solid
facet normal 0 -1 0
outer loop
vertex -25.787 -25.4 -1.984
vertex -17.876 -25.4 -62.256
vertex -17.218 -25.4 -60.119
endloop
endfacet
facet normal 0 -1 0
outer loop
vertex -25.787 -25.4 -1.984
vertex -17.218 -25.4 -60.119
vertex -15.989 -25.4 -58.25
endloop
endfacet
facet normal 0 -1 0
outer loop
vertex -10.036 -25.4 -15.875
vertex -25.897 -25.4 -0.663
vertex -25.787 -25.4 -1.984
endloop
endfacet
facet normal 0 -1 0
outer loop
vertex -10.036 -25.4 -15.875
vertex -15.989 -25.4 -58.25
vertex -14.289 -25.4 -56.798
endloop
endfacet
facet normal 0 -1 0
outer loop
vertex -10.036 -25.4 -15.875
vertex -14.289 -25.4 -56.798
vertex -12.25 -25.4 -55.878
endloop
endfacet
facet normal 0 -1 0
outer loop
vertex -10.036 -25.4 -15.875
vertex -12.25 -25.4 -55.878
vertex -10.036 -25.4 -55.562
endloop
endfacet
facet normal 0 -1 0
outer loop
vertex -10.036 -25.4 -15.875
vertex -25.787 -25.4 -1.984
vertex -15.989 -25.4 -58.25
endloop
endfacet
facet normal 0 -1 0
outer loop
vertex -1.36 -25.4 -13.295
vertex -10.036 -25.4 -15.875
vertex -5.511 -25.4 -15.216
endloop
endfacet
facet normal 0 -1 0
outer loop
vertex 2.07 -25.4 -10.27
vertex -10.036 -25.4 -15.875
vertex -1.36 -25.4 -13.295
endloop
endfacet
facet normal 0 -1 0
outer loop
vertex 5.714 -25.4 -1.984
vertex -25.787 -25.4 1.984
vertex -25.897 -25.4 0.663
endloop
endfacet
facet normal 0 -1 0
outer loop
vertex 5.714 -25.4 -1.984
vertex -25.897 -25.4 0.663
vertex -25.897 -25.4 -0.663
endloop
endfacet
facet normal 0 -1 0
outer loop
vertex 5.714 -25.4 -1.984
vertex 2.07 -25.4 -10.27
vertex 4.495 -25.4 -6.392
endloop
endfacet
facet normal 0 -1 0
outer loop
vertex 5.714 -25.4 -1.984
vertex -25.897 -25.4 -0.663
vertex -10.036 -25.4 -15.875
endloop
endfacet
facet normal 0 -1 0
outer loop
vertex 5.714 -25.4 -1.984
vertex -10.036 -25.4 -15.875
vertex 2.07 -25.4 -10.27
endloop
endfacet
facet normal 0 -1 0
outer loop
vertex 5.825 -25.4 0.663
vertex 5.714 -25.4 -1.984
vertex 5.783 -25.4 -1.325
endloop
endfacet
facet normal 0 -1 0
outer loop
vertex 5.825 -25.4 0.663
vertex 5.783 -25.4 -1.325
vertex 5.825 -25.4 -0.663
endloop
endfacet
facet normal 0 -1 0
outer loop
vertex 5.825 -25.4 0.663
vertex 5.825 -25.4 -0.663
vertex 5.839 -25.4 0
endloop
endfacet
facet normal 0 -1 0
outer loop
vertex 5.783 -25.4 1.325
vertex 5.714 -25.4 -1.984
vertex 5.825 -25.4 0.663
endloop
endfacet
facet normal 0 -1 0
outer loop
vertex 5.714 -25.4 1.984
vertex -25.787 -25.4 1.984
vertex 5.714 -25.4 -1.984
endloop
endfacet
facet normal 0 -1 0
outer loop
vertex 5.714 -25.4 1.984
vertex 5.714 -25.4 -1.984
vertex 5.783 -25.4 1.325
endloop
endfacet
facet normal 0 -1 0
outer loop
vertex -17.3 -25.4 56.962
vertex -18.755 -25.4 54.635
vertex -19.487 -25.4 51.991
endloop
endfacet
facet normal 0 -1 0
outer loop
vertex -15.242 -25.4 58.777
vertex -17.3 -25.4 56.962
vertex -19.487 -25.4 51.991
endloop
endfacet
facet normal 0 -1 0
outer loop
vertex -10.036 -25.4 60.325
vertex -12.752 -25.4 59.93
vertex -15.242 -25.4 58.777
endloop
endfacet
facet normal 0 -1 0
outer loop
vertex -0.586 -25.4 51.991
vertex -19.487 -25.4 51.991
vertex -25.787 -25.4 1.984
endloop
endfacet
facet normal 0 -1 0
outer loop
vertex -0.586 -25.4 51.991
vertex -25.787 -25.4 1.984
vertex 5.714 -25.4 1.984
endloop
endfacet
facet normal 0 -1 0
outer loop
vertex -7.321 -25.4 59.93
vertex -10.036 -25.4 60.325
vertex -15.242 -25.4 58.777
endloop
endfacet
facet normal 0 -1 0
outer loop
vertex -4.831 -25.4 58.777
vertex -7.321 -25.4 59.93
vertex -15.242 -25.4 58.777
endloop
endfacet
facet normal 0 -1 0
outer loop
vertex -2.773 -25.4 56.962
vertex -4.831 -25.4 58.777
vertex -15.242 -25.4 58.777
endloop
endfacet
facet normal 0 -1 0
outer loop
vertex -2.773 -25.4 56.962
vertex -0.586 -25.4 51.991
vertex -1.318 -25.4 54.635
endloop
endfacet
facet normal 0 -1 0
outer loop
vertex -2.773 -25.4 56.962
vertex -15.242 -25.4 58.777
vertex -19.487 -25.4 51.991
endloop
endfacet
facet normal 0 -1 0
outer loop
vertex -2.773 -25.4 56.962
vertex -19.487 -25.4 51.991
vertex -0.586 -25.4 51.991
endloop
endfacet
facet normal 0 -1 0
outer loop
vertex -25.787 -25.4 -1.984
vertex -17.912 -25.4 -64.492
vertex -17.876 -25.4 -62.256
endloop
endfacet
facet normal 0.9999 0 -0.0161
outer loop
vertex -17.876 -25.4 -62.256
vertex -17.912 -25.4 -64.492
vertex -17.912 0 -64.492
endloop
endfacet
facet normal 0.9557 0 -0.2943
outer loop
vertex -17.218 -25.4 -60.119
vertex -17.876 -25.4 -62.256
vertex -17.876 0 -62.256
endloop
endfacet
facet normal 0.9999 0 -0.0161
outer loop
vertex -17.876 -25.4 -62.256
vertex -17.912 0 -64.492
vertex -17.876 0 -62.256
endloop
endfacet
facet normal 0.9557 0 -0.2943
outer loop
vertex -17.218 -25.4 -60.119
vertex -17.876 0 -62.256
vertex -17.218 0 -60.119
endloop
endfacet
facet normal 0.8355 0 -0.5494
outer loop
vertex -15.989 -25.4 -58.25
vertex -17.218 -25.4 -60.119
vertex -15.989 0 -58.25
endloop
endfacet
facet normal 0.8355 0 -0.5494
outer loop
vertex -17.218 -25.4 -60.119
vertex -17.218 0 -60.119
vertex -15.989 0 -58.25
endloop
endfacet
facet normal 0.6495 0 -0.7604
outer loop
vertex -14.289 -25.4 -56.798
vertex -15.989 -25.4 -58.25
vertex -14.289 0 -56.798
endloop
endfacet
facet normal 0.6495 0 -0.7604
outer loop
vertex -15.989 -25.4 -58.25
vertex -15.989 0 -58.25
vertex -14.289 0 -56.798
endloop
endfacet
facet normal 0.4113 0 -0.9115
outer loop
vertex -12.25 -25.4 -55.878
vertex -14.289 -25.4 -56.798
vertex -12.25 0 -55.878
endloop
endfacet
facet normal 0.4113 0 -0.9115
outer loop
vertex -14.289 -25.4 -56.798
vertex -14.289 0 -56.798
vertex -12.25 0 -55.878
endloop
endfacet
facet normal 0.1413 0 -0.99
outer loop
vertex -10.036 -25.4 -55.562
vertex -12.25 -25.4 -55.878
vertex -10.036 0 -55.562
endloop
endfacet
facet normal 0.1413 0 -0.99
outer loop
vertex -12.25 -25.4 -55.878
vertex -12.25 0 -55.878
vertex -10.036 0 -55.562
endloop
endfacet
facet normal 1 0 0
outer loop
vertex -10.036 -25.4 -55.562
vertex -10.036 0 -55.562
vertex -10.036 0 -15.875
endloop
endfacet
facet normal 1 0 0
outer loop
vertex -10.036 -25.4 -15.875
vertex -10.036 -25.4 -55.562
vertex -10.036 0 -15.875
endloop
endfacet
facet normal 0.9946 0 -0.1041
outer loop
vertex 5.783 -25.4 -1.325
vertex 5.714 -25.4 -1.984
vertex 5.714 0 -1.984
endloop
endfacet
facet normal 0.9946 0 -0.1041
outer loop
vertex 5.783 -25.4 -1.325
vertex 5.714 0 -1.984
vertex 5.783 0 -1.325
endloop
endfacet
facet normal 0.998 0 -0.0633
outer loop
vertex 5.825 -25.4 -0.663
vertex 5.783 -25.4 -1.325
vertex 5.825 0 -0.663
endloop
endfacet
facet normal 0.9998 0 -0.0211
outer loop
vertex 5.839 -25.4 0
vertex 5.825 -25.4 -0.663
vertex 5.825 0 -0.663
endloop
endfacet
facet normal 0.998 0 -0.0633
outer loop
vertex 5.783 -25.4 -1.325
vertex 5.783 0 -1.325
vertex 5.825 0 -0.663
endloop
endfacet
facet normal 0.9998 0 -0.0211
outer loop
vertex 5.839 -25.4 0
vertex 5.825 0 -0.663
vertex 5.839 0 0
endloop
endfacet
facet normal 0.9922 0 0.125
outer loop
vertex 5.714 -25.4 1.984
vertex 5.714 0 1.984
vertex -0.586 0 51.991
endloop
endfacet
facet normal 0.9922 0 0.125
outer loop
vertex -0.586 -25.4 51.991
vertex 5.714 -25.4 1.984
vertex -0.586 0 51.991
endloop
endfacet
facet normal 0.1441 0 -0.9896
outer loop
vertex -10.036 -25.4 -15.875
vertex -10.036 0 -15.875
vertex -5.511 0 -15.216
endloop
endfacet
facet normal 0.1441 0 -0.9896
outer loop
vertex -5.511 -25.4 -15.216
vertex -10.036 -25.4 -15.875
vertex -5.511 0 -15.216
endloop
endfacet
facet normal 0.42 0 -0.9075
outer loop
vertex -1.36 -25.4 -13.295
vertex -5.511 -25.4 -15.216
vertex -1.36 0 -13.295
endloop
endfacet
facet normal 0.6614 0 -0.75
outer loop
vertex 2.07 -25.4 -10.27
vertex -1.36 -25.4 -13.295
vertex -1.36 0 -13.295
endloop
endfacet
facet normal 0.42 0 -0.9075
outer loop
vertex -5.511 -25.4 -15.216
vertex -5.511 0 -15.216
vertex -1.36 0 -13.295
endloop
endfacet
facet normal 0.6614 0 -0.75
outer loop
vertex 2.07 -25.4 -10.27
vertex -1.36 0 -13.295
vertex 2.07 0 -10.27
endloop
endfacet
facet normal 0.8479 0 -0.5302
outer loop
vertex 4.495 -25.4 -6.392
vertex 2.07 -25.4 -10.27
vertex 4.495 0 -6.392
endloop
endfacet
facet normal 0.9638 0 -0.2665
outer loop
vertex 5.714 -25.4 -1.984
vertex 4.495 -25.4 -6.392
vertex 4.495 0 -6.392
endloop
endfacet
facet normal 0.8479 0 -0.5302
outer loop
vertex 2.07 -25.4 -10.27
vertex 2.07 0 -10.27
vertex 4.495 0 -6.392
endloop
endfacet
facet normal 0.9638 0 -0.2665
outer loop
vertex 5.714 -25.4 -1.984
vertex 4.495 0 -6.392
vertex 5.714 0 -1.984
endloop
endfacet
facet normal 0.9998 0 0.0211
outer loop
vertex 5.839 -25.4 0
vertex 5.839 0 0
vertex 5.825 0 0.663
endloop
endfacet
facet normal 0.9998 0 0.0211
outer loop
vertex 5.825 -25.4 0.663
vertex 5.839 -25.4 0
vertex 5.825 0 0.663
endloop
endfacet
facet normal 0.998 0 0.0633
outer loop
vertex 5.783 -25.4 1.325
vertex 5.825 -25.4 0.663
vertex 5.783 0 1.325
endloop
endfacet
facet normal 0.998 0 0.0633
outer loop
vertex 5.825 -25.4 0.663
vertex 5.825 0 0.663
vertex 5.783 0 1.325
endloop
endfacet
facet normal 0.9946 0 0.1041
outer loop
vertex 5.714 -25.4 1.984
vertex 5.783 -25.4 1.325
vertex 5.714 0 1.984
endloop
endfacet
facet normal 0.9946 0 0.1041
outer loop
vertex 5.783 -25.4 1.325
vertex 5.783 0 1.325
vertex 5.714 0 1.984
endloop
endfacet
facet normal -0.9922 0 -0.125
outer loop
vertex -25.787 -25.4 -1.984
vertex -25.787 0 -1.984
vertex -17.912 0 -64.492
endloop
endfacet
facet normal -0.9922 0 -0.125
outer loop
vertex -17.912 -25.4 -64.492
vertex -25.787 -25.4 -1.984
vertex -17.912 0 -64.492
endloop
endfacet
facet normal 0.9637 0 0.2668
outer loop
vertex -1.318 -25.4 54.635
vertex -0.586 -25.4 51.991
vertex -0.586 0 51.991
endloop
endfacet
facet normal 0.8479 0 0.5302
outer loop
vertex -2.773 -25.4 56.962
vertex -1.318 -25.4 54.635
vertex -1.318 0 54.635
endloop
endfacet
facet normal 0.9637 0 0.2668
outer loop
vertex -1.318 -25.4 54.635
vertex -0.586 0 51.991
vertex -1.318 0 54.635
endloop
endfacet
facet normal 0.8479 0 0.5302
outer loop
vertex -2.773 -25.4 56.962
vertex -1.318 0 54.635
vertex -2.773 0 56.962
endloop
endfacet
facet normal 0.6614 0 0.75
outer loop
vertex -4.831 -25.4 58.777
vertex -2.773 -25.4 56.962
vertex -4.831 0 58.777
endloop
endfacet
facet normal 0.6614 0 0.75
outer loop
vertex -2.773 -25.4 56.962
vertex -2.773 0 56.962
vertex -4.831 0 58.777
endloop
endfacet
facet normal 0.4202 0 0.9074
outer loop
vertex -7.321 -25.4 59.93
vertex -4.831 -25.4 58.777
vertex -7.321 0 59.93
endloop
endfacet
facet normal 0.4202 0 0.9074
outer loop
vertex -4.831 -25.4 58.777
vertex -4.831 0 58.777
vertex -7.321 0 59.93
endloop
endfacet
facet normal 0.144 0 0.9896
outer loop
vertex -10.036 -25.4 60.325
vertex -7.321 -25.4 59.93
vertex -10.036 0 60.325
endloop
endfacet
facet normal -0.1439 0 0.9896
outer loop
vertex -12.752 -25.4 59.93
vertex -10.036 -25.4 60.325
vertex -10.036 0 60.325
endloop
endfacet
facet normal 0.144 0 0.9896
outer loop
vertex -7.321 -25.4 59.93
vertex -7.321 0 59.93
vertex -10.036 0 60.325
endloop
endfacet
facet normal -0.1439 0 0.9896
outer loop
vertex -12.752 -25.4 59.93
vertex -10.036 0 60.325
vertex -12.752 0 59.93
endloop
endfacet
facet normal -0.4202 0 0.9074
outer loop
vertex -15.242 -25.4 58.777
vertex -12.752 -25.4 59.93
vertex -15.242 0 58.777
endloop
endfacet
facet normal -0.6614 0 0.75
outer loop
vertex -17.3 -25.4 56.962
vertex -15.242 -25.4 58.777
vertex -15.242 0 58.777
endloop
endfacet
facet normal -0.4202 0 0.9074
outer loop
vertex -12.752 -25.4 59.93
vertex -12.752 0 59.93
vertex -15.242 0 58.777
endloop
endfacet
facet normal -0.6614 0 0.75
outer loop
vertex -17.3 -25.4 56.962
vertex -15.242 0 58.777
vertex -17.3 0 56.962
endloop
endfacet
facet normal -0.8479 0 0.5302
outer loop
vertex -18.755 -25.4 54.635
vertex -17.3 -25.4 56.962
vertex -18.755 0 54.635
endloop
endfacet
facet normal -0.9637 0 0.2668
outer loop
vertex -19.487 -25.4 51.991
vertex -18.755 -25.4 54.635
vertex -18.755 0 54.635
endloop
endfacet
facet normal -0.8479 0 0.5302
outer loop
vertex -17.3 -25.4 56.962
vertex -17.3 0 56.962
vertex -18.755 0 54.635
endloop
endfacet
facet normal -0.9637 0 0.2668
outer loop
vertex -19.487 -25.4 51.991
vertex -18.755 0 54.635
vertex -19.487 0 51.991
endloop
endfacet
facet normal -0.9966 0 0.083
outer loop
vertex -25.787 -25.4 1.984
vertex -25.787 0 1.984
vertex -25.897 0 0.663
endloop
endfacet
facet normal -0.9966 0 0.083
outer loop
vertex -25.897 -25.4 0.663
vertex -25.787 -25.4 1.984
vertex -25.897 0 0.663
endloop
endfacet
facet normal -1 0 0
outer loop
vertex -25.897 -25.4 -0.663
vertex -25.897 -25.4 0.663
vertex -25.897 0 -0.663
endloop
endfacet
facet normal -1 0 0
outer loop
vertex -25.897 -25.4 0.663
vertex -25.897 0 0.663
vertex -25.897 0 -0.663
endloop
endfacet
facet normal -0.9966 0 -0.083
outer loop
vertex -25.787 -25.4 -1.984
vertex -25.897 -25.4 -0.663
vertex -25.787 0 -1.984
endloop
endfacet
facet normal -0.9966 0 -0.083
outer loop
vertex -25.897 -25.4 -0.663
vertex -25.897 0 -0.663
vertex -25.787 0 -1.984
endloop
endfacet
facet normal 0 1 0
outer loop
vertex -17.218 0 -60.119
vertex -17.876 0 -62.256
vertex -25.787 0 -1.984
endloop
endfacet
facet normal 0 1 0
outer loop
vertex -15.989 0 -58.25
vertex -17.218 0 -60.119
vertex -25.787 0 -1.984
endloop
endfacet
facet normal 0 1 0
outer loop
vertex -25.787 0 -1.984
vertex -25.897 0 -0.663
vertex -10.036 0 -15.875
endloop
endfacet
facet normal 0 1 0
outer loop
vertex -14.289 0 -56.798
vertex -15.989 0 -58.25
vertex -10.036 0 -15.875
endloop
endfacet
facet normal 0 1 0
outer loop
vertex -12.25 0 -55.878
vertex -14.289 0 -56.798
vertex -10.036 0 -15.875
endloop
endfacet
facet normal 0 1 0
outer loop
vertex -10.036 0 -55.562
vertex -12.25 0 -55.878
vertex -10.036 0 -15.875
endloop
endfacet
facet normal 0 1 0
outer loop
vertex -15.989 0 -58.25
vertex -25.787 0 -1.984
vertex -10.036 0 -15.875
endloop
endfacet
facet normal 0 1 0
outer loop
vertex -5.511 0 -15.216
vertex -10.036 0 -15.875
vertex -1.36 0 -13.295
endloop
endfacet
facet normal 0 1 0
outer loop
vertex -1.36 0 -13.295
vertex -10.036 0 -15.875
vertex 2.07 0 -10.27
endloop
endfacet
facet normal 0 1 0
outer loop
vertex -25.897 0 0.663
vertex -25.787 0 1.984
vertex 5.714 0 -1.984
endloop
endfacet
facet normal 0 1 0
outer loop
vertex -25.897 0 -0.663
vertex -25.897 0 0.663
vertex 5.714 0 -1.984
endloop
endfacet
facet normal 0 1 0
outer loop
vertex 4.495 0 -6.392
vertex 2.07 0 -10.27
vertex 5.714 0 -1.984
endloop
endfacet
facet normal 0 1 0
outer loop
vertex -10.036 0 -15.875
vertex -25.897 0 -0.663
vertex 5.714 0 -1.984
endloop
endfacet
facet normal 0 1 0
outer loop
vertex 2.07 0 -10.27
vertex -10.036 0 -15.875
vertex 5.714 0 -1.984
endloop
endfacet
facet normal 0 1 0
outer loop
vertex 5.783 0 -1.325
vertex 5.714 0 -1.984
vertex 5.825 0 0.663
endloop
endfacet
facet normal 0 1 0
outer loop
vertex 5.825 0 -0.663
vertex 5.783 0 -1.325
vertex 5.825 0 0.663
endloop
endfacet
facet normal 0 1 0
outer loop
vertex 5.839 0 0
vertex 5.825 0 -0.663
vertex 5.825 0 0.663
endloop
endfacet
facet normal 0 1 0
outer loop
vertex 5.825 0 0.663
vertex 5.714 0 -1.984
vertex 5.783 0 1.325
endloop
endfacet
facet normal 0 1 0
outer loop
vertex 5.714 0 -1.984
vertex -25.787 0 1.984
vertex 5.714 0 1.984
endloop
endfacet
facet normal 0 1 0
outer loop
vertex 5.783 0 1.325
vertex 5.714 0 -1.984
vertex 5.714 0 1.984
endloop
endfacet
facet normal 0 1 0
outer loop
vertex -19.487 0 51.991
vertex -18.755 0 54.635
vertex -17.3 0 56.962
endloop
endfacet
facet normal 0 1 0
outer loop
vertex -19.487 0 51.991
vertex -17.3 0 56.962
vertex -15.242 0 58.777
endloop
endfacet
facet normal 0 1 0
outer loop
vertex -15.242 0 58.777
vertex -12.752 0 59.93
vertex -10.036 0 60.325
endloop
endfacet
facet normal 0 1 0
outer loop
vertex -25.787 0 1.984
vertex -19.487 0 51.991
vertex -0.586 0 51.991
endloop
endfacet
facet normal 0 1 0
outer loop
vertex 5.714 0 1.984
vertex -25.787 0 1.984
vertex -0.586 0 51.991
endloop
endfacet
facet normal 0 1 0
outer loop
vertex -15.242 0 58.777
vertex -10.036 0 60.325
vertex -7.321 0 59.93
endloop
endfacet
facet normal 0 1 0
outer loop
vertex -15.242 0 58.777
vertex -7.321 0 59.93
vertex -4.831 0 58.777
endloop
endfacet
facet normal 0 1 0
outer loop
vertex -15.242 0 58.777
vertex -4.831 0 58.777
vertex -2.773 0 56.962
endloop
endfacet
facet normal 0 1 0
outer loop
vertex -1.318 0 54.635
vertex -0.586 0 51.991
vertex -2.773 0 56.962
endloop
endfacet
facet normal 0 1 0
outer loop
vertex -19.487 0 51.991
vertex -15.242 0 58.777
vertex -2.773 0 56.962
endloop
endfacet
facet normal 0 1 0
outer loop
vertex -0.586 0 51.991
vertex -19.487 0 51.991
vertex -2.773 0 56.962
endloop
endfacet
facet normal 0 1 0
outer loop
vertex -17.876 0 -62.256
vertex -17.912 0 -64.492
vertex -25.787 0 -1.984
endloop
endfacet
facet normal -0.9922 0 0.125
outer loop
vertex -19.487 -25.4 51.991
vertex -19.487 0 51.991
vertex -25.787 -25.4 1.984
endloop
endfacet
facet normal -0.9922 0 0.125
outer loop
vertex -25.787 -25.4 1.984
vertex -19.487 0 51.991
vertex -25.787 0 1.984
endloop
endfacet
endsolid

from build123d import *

# Parameters (mm, degrees)
F1_DEPTH = 25.4


with BuildPart() as f1:
    # F0 (on Front) → F1 (new body)
    with BuildSketch(Plane.XZ):
        with BuildLine():
            Line((-10.0362645829, 15.875), (-10.0362645829, 41.275))
            ThreePointArc((-10.0362645829, 41.275), (-17.1800145829, 44.4998046905), (-19.4865575472, 51.990625))
            Line((-19.4865575472, 51.990625), (-25.7867528388, 1.9843751413))
            ThreePointArc((-25.7867528388, 1.9843751413), (-20.5365900453, 11.9062500471), (-10.0362645829, 15.875))
        make_face()
        with BuildLine():
            ThreePointArc((-0.5112645829, 50.8), (-3.3010724921, 44.0648079092), (-10.0362645829, 41.275))
            Line((-10.0362645829, 41.275), (-10.0362645829, 15.875))
            ThreePointArc((-10.0362645829, 15.875), (0.4640609188, 11.9062500123), (5.7142236861, 1.984375037))
            Line((5.7142236861, 1.984375037), (-0.5859716187, 51.990625))
            ThreePointArc((-0.5859716187, 51.990625), (-0.5299596887, 51.396483242), (-0.5112645829, 50.8))
        make_face()
        with BuildLine():
            Line((-10.0362645829, -15.875), (-10.0362645829, 15.875))
            ThreePointArc((-10.0362645829, 15.875), (-20.5365900453, 11.9062500471), (-25.7867528388, 1.9843751413))
            ThreePointArc((-25.7867528388, 1.9843751413), (-25.9112645829, 5.44e-08), (-25.7867528524, -1.9843750333))
            ThreePointArc((-25.7867528524, -1.9843750333), (-20.5365900862, -11.9062500111), (-10.0362645829, -15.875))
        make_face()
        with BuildLine():
            ThreePointArc((5.7142236861, 1.984375037), (0.4640609188, 11.9062500123), (-10.0362645829, 15.875))
            Line((-10.0362645829, 15.875), (-10.0362645829, -15.875))
            ThreePointArc((-10.0362645829, -15.875), (0.4640609203, -11.9062500111), (5.7142236865, -1.9843750333))
            ThreePointArc((5.7142236865, -1.9843750333), (5.8075769064, -0.9941387534), (5.8387354171, 0))
            ThreePointArc((5.8387354171, 0), (5.8075769063, 0.9941387552), (5.7142236861, 1.984375037))
        make_face()
        with BuildLine():
            Line((-10.0362645829, -55.5625), (-10.0362645829, -15.875))
            ThreePointArc((-10.0362645829, -15.875), (-20.5365900862, -11.9062500111), (-25.7867528524, -1.9843750333))
            Line((-25.7867528524, -1.9843750333), (-17.9115087198, -64.4921875))
            ThreePointArc((-17.9115087198, -64.4921875), (-15.9893895829, -58.2498372421), (-10.0362645829, -55.5625))
        make_face()
        with BuildLine():
            ThreePointArc((-19.4865575472, 51.990625), (-17.1800145829, 44.4998046905), (-10.0362645829, 41.275))
            ThreePointArc((-10.0362645829, 41.275), (-3.3010724921, 44.0648079092), (-0.5112645829, 50.8))
            ThreePointArc((-0.5112645829, 50.8), (-0.5299596887, 51.396483242), (-0.5859716187, 51.990625))
            ThreePointArc((-0.5859716187, 51.990625), (-10.0362645829, 60.325), (-19.4865575472, 51.990625))
        make_face()
    extrude(amount=F1_DEPTH)


solid = f1.part
